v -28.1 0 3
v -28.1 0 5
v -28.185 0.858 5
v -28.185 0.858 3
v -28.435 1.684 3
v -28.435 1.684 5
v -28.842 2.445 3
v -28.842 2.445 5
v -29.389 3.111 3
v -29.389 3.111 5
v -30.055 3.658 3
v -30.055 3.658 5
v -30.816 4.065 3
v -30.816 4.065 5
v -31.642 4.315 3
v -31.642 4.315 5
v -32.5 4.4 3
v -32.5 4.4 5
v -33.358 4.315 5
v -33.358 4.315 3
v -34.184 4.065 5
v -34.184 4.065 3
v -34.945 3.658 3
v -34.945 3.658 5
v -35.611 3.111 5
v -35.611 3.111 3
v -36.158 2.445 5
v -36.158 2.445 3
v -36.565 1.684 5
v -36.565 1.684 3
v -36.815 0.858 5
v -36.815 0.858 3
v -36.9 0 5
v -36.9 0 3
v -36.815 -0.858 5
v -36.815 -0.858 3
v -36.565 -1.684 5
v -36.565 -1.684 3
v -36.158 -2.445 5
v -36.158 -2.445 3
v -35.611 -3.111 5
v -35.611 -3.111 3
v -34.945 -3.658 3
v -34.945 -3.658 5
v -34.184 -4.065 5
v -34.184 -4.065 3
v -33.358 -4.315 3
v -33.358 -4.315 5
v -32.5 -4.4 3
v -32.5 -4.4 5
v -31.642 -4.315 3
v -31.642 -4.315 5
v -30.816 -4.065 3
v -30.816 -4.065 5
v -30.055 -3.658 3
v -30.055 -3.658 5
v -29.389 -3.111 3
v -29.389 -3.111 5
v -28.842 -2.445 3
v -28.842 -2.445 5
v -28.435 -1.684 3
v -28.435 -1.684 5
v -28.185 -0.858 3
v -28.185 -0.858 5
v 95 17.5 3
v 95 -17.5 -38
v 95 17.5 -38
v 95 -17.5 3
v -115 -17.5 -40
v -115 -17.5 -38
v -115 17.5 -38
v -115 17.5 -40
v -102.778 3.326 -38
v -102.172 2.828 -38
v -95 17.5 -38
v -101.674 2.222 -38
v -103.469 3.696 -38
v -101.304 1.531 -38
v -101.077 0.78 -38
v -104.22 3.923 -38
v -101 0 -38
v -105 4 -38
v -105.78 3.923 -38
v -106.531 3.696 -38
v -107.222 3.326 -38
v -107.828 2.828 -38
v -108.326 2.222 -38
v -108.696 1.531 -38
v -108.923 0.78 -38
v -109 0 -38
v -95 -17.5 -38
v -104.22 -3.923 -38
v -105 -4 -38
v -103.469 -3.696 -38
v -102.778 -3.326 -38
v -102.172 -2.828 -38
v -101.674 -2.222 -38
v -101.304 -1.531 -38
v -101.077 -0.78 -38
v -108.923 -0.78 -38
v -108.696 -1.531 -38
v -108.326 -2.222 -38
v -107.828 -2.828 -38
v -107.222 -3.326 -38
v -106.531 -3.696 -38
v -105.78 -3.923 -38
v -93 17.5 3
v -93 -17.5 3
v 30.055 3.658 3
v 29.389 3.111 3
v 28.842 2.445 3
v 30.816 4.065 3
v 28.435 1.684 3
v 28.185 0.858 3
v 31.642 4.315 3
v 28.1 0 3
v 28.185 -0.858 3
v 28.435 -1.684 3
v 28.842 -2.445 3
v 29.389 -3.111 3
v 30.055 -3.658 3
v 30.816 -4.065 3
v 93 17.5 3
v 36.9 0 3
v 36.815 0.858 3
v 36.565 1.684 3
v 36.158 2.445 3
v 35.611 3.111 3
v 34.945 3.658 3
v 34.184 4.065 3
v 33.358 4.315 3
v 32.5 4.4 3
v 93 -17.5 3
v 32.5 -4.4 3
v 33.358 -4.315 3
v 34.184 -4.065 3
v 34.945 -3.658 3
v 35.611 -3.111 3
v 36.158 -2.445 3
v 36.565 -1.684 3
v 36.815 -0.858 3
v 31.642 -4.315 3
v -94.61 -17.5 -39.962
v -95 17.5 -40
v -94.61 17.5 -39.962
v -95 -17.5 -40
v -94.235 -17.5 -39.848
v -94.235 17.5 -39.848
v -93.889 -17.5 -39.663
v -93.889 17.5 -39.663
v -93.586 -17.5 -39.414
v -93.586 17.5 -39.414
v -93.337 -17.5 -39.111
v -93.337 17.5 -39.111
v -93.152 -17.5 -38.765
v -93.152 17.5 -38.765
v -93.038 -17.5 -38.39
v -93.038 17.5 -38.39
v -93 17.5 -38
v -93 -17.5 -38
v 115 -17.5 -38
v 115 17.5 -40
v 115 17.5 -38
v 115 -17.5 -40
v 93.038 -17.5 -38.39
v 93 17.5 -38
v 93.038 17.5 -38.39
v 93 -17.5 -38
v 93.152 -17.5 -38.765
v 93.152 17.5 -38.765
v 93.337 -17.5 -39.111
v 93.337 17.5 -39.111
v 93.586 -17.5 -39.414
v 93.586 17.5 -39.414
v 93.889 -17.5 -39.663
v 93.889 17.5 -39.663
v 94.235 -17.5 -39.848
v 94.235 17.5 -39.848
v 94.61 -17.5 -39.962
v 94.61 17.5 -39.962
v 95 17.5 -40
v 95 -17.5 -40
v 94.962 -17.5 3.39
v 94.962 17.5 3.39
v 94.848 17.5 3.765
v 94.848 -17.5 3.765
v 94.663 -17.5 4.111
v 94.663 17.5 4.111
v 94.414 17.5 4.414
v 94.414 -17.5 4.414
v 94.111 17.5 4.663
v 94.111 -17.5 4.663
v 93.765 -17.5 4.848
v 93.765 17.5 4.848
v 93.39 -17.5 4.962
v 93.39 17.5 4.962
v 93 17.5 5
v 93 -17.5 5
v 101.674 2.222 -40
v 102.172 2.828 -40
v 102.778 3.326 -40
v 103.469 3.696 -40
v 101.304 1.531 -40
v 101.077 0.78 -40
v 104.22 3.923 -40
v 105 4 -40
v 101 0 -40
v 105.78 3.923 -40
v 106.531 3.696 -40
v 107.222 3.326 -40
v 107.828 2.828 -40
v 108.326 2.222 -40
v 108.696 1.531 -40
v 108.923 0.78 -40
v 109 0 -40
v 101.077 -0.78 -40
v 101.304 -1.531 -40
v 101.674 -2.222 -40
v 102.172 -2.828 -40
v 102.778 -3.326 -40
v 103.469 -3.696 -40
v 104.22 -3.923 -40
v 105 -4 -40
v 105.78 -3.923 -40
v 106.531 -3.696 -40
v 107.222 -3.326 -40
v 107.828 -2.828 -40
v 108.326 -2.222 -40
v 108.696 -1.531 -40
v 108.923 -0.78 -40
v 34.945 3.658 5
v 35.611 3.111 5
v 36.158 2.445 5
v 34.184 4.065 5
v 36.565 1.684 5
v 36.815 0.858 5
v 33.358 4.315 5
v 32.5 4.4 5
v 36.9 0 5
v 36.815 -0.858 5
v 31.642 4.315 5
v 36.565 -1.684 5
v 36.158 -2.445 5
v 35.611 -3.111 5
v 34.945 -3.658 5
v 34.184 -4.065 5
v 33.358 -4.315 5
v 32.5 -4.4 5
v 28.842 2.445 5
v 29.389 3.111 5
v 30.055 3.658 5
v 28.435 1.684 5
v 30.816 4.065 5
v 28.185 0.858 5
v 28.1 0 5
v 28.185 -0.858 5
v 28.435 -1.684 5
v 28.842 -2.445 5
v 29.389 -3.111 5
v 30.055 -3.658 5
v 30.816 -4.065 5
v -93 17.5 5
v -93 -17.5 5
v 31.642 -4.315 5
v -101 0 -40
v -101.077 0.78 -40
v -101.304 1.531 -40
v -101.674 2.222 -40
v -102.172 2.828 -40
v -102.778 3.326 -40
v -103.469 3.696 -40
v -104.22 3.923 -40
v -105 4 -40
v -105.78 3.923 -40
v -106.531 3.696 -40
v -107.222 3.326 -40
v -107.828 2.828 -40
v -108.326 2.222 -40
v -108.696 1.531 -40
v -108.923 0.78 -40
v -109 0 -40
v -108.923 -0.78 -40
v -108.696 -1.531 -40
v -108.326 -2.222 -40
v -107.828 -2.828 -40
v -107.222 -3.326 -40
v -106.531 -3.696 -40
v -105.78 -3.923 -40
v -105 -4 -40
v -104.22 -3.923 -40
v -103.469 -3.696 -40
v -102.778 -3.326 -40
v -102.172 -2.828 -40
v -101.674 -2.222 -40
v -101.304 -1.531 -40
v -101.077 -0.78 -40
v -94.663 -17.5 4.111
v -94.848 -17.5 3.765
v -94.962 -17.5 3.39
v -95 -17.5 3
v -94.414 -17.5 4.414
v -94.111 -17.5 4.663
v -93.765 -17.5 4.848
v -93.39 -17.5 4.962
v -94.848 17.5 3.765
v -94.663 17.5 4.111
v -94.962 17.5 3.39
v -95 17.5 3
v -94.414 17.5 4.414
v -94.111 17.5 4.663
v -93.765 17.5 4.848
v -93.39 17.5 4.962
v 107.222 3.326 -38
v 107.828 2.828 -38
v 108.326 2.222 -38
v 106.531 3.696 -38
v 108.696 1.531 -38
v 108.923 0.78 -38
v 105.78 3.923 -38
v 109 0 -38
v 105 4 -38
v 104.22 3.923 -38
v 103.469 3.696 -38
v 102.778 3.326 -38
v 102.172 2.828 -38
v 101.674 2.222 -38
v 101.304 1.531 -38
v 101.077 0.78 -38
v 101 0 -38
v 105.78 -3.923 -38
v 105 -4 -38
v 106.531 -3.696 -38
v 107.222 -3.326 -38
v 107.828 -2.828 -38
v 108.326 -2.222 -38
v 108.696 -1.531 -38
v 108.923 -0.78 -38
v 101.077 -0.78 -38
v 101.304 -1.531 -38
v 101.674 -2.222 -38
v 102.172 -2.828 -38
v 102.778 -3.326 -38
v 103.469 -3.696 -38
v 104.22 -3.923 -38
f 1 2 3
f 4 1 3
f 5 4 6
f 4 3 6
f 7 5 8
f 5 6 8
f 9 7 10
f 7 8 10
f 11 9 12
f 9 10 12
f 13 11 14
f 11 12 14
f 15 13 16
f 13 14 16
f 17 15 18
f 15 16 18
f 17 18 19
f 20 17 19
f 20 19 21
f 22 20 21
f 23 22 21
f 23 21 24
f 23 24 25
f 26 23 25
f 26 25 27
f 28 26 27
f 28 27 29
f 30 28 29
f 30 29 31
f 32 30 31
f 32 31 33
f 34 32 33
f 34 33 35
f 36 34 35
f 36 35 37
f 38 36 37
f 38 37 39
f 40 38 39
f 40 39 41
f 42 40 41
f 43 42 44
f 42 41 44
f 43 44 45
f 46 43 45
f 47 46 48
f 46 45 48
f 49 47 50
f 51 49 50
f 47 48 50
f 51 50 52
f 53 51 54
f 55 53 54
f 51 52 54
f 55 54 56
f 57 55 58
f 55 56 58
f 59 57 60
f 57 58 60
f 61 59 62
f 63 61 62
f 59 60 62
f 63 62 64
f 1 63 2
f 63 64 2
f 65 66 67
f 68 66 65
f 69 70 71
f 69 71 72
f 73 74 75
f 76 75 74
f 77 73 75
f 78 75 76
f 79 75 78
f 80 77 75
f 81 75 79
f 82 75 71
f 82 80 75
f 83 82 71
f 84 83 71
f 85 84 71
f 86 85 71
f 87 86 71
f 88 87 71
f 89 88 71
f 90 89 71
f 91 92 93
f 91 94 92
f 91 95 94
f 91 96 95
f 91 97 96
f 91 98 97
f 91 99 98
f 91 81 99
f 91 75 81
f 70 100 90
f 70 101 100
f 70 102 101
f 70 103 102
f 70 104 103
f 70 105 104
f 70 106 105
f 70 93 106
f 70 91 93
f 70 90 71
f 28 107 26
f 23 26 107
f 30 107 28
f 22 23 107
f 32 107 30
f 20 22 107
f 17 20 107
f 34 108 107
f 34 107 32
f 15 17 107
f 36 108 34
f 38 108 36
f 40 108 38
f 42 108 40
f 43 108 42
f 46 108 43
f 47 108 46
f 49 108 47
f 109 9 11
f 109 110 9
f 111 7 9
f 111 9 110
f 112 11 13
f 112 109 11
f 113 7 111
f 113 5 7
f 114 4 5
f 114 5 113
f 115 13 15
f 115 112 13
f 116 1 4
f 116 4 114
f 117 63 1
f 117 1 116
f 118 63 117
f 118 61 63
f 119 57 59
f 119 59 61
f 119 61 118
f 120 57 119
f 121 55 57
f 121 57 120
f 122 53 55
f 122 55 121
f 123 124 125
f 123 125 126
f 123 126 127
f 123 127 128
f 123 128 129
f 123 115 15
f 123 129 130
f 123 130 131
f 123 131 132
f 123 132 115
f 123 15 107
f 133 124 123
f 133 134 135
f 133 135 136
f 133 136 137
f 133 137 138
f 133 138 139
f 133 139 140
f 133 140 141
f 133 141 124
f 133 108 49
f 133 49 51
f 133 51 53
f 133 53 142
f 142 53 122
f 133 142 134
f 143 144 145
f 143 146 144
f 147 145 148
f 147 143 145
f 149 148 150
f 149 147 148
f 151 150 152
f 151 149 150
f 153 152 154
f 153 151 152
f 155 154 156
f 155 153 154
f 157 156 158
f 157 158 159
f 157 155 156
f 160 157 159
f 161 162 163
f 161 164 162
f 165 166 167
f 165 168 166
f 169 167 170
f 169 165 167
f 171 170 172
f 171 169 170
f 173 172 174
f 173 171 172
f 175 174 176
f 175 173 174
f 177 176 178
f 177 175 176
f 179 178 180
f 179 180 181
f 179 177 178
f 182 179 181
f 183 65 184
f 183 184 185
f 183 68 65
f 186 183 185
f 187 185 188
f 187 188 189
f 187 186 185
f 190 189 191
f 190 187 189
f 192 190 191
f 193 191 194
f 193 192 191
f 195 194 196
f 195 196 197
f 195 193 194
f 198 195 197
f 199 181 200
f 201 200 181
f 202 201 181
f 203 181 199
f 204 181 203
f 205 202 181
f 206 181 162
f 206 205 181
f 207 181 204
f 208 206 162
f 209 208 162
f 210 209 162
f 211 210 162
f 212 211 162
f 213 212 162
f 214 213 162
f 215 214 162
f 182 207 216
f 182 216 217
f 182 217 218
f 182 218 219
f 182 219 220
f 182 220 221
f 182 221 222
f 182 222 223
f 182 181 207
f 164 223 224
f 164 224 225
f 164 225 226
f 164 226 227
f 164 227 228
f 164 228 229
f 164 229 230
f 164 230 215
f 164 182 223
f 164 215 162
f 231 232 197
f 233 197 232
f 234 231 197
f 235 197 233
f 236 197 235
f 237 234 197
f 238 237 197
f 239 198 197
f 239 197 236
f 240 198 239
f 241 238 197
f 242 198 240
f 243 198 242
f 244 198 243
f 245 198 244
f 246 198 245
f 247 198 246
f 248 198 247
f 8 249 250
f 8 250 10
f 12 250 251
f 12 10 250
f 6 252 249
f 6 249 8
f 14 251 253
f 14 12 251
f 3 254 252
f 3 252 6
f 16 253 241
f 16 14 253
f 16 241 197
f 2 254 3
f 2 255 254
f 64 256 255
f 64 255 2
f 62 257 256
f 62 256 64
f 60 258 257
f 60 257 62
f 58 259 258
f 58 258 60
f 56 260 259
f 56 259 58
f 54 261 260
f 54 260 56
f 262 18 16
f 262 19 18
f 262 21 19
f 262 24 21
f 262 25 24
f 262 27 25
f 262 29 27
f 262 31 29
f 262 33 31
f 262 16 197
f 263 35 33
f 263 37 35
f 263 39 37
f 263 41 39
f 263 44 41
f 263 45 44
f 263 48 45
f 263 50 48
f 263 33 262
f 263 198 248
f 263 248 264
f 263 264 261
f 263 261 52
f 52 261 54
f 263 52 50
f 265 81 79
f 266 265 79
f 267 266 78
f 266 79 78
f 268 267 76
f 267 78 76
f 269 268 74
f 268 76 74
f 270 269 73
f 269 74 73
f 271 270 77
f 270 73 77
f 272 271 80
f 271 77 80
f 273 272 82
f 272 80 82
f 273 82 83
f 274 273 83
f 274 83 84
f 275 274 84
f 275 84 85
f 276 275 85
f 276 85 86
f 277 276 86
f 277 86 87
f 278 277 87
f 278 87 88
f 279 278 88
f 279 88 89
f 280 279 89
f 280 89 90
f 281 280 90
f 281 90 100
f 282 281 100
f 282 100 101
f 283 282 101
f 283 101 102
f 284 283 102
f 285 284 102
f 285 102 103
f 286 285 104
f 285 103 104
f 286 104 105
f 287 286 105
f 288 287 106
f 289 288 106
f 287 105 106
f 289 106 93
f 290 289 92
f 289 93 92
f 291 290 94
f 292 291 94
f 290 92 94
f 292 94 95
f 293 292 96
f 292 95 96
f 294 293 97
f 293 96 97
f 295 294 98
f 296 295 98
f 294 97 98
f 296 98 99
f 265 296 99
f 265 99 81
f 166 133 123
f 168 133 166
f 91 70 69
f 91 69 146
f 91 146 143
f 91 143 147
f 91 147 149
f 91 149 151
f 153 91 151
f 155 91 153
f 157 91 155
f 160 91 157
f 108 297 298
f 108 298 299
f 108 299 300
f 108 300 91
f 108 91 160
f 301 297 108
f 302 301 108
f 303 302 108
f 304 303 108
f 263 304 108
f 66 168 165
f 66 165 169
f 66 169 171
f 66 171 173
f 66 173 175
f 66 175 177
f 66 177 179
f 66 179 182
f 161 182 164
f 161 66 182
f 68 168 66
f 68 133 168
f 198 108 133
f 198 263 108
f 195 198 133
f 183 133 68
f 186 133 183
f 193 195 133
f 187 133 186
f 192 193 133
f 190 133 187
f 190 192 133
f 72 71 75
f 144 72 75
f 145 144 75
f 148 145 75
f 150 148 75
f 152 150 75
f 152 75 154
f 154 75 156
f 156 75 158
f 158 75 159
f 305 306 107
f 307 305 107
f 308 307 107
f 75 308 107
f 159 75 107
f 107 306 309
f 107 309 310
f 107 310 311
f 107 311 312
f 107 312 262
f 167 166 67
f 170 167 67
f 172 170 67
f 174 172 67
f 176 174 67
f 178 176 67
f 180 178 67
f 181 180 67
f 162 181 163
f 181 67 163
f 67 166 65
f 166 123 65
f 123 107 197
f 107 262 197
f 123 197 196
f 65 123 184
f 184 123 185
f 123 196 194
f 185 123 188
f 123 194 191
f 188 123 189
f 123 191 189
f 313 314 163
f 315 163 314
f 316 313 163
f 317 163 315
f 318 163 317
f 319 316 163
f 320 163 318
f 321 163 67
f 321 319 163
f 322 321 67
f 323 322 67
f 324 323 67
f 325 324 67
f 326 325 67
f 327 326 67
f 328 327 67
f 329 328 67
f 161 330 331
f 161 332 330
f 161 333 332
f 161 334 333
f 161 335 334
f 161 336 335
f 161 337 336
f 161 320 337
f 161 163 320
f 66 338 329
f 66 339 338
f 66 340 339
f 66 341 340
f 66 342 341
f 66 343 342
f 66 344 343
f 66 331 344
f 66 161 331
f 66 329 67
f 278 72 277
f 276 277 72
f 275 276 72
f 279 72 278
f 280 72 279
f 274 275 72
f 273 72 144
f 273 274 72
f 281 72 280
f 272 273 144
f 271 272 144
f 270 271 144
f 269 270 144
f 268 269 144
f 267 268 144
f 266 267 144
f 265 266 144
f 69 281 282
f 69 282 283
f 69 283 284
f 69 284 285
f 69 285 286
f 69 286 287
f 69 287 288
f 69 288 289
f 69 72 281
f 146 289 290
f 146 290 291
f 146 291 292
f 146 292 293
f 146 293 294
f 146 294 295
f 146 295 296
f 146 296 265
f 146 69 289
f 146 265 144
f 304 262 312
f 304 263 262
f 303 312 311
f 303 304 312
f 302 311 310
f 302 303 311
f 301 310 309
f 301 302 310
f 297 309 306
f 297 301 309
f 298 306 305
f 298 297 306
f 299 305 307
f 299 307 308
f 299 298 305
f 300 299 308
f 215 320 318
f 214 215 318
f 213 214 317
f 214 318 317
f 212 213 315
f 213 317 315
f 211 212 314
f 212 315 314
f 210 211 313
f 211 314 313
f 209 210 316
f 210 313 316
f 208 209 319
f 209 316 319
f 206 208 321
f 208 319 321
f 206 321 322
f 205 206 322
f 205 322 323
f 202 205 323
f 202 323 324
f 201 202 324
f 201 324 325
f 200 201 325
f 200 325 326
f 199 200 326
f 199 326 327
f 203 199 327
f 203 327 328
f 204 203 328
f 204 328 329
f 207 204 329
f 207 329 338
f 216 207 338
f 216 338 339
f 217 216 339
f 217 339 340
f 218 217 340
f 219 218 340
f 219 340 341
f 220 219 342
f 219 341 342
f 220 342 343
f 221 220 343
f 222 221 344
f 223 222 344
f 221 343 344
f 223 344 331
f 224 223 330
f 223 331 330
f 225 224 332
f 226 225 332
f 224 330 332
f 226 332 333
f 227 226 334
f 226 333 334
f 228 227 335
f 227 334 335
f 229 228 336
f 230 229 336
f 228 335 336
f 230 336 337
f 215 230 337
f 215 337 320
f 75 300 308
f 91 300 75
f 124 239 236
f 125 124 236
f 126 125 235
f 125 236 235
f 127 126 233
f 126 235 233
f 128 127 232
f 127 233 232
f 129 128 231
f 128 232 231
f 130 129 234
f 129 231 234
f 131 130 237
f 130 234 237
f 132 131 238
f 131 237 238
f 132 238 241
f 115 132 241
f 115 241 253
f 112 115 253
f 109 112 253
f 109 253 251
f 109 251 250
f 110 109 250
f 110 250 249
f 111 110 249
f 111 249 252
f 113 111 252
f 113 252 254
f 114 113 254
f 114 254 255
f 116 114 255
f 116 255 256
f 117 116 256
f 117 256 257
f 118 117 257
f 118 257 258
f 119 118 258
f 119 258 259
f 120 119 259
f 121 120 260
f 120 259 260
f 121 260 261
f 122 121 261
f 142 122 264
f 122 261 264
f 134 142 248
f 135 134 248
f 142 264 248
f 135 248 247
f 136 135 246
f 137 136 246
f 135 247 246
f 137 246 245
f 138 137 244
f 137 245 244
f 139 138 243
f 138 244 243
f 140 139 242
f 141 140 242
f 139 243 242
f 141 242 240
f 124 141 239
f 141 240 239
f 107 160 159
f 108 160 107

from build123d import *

# Parameters (mm, degrees)
F1_DEPTH = 17.5
F2_R     = 4
F3_DEPTH = 25
F4_R     = 4.4
F5_DEPTH = 25
F6_R     = 2


# Not quite as in the source:
# - a feature names something its author has since deleted; it is built from what else it names


with BuildPart() as f1:
    # F0 (on Front) → F1 (new body, symmetric)
    with BuildSketch(Plane.XZ):
        Polygon((95, -38), (95, 5), (-95, 5), (-95, -38), (-115, -38), (-115, -40), (-93, -40), (-93, 3), (93, 3), (93, -40), (115, -40), (115, -38), align=None)
    extrude(amount=F1_DEPTH, both=True)

    # F2 (on face) → F3 (cut)
    with BuildSketch(Plane.XY.offset(-38)):
        with Locations((-105, 0)):
            Circle(F2_R)
        with Locations((105, 0)):
            Circle(F2_R)
    extrude(amount=-F3_DEPTH, mode=Mode.SUBTRACT)

    # F4 (on face) → F5 (cut)
    with BuildSketch(Plane.XY.offset(5)):
        with Locations((-32.5, 0)):
            Circle(F4_R)
        with Locations((32.5, 0)):
            Circle(F4_R)
    extrude(amount=-F5_DEPTH, mode=Mode.SUBTRACT)

    # F6
    f6_edges = [f1.edges().sort_by_distance(p)[0] for p in [
        (95, 0, 5),
        (-95, 0, 5),
        (-93, 0, -40),
        (93, 0, -40),
    ]]
    fillet(f6_edges, radius=F6_R)


solid = f1.part
